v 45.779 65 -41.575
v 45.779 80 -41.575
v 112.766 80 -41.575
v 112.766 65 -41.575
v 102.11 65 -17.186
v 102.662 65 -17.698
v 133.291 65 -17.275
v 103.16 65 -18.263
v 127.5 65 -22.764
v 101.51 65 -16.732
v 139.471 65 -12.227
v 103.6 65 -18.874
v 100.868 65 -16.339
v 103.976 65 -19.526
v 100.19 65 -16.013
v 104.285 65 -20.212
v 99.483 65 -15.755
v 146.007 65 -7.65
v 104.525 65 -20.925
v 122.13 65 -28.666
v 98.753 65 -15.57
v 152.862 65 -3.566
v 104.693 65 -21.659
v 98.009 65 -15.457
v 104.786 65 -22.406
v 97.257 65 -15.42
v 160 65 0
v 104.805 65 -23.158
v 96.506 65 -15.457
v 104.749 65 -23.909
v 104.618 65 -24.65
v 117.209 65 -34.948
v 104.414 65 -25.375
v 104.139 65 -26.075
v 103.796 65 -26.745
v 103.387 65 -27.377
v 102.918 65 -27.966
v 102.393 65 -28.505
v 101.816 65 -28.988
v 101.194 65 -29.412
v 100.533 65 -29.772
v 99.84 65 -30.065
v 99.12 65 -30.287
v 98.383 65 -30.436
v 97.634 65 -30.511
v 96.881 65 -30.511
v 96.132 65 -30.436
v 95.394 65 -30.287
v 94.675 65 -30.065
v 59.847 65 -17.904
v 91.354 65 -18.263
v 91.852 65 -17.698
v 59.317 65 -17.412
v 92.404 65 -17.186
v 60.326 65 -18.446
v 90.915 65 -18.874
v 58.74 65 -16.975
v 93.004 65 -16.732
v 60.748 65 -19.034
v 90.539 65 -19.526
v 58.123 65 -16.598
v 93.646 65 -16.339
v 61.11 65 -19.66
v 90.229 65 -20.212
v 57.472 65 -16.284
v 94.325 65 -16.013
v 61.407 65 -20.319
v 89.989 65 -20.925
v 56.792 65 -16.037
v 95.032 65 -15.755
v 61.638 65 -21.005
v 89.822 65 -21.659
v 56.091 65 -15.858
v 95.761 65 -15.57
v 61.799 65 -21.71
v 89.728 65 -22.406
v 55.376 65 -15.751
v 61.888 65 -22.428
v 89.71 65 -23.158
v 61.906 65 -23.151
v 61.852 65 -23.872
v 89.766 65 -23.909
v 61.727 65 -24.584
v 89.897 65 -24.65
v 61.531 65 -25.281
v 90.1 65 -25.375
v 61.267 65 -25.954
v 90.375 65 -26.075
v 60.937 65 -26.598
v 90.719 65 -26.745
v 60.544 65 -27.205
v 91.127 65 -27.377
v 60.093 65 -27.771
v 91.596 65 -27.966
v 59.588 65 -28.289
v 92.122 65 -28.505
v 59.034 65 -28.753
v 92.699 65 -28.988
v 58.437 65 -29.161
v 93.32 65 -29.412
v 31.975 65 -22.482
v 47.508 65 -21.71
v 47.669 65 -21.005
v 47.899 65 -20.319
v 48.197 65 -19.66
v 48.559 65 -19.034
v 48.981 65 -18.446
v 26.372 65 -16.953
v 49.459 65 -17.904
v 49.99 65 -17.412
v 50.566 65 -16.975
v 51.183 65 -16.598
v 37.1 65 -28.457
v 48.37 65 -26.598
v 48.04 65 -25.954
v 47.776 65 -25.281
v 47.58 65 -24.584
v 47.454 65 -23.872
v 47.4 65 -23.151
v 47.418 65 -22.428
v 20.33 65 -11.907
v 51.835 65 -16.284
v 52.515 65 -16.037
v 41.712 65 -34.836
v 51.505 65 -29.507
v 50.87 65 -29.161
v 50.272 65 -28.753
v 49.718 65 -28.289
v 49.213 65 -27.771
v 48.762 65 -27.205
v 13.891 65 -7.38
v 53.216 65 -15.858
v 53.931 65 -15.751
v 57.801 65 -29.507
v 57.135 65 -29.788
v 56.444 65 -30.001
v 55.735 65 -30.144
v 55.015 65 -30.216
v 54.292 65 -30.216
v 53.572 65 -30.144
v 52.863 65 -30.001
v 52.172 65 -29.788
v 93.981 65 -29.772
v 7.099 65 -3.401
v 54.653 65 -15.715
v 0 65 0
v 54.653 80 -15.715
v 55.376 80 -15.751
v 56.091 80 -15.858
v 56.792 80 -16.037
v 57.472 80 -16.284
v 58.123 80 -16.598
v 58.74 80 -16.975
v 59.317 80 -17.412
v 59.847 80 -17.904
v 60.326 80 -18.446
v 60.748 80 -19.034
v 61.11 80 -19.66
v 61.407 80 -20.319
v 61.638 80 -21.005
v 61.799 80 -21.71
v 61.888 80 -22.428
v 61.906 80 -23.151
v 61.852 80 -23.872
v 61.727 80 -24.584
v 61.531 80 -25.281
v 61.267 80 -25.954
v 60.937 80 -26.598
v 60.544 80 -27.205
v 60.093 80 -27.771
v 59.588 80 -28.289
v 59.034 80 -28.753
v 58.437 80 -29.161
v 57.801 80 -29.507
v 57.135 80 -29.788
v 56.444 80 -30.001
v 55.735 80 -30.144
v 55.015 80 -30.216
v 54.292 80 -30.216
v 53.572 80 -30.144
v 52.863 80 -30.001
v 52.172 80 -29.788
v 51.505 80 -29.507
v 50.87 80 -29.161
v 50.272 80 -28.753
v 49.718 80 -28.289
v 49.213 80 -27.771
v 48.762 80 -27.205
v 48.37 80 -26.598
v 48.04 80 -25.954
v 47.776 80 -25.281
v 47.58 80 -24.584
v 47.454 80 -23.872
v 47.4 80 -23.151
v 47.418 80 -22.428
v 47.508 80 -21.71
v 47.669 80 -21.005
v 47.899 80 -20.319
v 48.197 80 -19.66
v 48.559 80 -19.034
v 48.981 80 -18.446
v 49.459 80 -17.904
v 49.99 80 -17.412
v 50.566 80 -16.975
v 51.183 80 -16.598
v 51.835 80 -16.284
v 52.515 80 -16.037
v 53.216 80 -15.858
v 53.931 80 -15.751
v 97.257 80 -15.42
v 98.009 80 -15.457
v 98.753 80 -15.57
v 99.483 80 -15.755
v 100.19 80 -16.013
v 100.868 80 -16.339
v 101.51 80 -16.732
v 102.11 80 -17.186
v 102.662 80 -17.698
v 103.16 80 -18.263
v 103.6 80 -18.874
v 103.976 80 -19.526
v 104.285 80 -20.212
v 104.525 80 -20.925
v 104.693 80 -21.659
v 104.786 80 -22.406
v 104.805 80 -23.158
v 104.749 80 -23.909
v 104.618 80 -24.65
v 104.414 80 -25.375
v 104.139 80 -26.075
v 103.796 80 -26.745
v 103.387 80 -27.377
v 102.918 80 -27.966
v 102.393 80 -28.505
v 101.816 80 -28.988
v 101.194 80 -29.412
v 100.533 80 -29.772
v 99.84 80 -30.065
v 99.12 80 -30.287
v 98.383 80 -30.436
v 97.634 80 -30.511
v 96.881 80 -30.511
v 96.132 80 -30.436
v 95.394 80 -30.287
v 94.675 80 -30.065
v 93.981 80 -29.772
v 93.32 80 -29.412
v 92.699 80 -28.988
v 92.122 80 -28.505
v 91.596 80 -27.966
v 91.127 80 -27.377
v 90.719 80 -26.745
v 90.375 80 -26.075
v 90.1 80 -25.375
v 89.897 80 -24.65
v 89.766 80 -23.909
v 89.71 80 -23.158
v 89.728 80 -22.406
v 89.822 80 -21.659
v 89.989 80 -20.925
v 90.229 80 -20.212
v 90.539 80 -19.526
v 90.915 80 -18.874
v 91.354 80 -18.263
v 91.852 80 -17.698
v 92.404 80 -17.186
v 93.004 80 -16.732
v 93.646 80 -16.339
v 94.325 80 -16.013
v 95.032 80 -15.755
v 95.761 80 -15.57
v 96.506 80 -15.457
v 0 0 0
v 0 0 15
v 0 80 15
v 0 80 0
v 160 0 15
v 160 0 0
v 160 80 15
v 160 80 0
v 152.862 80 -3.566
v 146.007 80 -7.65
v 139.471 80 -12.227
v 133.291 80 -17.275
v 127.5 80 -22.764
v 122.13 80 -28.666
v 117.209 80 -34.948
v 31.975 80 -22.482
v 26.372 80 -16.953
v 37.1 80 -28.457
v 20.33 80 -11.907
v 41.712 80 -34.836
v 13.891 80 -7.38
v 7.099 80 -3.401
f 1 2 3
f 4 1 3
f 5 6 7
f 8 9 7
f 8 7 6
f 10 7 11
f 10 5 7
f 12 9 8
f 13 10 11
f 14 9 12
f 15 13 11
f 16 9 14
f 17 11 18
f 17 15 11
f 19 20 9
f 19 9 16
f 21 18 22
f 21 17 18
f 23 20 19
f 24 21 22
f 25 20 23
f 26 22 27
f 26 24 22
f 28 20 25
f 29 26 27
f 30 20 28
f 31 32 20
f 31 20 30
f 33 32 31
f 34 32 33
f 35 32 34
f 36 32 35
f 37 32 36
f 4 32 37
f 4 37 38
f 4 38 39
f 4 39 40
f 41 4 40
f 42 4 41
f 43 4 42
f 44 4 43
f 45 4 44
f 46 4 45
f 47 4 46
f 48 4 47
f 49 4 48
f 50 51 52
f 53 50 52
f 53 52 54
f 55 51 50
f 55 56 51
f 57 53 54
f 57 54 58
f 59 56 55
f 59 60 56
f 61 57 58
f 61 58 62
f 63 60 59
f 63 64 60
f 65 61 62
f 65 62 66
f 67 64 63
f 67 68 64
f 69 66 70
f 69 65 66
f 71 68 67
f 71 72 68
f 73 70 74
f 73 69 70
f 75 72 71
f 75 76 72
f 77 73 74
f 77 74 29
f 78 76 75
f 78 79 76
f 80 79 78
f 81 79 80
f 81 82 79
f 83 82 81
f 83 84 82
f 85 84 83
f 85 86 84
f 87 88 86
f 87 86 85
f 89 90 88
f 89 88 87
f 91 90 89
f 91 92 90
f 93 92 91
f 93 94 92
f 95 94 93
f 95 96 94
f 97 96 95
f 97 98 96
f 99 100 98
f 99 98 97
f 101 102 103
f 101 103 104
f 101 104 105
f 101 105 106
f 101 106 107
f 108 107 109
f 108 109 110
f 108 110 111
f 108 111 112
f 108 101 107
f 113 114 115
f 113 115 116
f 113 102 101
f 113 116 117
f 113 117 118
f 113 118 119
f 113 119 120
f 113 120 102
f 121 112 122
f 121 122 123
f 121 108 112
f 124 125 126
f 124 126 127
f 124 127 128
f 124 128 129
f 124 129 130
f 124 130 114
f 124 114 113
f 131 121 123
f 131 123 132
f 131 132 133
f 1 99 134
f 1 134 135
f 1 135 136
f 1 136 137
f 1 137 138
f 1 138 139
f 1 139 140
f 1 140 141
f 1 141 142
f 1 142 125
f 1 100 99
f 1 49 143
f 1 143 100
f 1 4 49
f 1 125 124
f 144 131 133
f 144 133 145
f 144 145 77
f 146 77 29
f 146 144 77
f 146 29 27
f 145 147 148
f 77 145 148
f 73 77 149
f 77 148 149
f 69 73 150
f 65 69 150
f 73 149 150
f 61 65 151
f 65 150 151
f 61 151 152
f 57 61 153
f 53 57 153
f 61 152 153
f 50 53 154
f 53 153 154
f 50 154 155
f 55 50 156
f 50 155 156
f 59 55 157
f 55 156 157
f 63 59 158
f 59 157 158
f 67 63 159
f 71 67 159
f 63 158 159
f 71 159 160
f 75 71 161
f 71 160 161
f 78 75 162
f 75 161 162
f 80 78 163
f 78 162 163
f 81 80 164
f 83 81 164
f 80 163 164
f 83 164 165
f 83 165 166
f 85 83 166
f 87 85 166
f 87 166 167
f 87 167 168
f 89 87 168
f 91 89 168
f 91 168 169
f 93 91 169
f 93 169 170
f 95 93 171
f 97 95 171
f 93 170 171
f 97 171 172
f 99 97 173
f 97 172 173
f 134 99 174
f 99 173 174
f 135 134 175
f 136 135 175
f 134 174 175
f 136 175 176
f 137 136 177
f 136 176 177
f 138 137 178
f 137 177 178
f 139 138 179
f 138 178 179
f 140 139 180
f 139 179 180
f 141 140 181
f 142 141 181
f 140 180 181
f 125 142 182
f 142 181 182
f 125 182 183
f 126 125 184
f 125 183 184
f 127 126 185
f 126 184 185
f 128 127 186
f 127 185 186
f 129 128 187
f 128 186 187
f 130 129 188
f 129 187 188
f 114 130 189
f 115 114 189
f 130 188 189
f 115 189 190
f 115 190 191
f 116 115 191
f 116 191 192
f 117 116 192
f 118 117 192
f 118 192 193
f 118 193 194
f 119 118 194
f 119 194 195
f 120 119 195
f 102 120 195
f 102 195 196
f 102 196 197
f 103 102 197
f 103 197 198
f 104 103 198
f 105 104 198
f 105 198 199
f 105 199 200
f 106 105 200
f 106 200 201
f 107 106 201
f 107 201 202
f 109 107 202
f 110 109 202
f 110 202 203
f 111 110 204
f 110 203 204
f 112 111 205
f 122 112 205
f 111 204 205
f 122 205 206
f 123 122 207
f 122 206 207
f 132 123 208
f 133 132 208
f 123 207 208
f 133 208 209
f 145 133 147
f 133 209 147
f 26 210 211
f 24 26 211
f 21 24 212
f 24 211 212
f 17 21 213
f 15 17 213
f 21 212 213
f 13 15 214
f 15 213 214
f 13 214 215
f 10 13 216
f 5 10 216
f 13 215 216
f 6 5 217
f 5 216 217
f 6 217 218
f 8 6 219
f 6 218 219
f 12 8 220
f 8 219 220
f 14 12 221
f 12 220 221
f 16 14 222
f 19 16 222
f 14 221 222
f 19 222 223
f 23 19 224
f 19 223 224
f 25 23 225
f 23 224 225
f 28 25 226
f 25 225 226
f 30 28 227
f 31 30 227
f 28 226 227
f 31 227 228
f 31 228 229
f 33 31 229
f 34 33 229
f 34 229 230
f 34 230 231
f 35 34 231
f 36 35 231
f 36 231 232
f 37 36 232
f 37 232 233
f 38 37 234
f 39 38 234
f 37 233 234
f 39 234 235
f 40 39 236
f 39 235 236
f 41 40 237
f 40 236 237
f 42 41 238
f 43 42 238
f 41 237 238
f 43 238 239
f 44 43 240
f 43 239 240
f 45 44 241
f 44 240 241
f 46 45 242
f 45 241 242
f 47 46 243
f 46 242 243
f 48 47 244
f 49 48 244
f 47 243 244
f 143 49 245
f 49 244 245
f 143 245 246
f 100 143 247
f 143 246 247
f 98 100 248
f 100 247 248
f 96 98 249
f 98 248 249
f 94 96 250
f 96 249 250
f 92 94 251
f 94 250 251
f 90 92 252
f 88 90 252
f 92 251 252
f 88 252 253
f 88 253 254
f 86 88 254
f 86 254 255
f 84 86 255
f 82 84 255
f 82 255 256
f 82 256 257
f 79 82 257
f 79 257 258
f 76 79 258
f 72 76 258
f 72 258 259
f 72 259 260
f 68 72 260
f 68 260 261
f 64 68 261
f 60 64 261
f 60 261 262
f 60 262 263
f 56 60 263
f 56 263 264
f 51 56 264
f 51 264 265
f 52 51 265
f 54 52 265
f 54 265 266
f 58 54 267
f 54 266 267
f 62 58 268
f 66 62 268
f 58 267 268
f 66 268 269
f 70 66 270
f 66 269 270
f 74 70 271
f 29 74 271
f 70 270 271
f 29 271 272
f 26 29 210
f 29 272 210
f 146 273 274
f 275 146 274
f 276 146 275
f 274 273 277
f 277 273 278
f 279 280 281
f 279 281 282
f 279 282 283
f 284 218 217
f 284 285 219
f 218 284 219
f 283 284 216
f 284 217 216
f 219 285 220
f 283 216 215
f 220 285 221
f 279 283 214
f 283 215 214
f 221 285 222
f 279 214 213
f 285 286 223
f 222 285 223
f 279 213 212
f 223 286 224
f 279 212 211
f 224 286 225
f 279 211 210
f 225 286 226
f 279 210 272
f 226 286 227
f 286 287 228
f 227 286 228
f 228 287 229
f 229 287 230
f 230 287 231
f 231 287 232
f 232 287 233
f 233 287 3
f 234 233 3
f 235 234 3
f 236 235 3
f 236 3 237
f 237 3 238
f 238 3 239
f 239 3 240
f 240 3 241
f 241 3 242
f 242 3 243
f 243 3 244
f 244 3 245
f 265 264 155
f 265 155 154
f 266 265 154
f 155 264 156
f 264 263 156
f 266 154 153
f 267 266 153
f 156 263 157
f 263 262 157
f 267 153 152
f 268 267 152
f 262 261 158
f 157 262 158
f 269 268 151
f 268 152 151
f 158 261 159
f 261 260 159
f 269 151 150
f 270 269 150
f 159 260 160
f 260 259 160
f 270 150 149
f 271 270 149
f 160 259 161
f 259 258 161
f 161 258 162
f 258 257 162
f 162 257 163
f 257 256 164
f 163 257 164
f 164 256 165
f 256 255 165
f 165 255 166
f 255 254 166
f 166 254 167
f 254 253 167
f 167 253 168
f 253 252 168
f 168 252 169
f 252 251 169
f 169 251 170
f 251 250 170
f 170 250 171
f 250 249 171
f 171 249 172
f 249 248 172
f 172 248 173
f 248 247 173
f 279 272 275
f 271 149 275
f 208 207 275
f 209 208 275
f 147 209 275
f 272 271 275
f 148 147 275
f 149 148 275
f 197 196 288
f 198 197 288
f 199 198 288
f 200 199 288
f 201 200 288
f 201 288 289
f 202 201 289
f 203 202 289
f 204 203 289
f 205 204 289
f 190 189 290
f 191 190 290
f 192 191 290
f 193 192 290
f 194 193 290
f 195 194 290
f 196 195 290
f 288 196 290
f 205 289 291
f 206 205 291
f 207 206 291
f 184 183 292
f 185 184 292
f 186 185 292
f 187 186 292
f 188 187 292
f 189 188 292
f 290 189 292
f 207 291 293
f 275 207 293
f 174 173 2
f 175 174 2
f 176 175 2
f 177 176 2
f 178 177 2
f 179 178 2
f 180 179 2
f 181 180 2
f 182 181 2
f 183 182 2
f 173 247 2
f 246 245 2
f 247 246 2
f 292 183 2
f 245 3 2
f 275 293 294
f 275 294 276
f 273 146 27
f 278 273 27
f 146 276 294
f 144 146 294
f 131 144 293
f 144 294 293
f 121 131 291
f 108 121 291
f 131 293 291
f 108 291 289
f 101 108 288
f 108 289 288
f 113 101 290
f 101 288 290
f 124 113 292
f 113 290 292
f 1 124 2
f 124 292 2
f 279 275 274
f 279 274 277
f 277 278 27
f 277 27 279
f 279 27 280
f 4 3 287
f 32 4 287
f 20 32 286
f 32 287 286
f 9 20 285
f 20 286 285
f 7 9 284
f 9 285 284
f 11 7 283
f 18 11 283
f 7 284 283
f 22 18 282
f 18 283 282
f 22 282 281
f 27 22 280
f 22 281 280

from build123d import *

# Parameters (mm, degrees)
SKETCH1_W           = 160
SKETCH1_H           = 80
BOSS_EXTRUDE1_DEPTH = 15
SKETCH2_R           = 7.550070769
SKETCH2_R_2         = 7.255415261
BOSS_EXTRUDE2_DEPTH = 15


with BuildPart() as part:
    # Sketch1 → Boss-Extrude1 (new body)
    with BuildSketch(Plane.XY):
        with Locations((80, 40)):
            Rectangle(SKETCH1_W, SKETCH1_H)
    extrude(amount=BOSS_EXTRUDE1_DEPTH)

    # Sketch2 → Boss-Extrude2 (add)
    with BuildSketch(Plane(origin=(0, 80, 0), x_dir=(1, 0, 0), z_dir=(0, 1, 0))):
        with BuildLine():
            ThreePointArc((112.765660055, 41.575459997), (133.290805297, 17.274846503), (160, 0))
            Line((160, 0), (0, 0))
            ThreePointArc((0, 0), (26.372008671, 16.953021182), (45.778792932, 41.575459997))
            Line((45.778792932, 41.575459997), (112.765660055, 41.575459997))
        make_face()
        with Locations(Location((97.257304614, 22.969928459, 0), (0, 0, 270))):
            Circle(SKETCH2_R, mode=Mode.SUBTRACT)
        with Locations(Location((54.653333848, 22.969928459, 0), (0, 0, 270))):
            Circle(SKETCH2_R_2, mode=Mode.SUBTRACT)
    extrude(amount=-BOSS_EXTRUDE2_DEPTH)


solid = part.part
